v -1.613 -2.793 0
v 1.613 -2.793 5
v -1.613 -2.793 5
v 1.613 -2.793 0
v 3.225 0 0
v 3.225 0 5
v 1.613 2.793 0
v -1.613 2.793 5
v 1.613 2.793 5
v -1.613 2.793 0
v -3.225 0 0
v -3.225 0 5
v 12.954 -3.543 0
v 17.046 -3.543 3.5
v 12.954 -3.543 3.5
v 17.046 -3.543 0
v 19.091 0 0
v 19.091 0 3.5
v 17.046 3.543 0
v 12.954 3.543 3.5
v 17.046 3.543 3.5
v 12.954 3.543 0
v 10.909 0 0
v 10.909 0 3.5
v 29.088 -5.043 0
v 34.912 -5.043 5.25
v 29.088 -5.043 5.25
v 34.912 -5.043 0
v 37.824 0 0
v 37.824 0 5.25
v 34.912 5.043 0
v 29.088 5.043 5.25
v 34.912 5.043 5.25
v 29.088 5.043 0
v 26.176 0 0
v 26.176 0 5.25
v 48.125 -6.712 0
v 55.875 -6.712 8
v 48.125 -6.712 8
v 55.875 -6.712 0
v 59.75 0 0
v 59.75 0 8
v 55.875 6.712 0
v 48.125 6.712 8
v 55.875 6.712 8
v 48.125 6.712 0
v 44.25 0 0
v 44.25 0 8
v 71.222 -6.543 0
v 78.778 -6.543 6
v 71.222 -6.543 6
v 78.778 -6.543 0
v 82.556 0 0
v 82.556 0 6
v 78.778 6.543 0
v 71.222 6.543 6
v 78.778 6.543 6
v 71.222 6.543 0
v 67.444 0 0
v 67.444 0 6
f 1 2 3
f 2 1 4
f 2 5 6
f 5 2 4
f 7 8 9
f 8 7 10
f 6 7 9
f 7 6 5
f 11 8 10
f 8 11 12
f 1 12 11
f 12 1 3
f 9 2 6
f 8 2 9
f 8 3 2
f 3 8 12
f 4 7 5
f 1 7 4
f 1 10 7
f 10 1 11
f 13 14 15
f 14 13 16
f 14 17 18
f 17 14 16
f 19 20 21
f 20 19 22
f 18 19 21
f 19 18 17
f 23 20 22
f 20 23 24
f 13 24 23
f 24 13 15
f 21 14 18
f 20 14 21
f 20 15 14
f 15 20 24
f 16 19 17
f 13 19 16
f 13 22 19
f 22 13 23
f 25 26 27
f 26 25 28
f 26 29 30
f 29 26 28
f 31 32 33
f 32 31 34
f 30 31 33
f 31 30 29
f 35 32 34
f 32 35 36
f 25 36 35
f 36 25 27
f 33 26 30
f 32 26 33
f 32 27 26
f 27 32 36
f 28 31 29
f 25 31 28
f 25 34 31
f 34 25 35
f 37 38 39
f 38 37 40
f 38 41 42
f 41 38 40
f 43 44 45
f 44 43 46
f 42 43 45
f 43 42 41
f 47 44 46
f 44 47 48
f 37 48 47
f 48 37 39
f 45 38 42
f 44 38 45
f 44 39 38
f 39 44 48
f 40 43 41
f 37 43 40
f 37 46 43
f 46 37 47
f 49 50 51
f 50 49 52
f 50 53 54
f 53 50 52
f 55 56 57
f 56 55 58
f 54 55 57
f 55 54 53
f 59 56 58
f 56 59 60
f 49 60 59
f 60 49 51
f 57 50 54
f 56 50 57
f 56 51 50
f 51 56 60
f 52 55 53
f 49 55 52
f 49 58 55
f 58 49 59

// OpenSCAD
use <../nscad-lib.scad>

color("orange")    m3_nut();
color("steelblue") move(15) m4_nut();
color("seagreen")  move(32) m6_nut();
color("orchid")    move(52) m8_nut();
color("gold")      move(75) m_nut(sw = 13, h = 6);
